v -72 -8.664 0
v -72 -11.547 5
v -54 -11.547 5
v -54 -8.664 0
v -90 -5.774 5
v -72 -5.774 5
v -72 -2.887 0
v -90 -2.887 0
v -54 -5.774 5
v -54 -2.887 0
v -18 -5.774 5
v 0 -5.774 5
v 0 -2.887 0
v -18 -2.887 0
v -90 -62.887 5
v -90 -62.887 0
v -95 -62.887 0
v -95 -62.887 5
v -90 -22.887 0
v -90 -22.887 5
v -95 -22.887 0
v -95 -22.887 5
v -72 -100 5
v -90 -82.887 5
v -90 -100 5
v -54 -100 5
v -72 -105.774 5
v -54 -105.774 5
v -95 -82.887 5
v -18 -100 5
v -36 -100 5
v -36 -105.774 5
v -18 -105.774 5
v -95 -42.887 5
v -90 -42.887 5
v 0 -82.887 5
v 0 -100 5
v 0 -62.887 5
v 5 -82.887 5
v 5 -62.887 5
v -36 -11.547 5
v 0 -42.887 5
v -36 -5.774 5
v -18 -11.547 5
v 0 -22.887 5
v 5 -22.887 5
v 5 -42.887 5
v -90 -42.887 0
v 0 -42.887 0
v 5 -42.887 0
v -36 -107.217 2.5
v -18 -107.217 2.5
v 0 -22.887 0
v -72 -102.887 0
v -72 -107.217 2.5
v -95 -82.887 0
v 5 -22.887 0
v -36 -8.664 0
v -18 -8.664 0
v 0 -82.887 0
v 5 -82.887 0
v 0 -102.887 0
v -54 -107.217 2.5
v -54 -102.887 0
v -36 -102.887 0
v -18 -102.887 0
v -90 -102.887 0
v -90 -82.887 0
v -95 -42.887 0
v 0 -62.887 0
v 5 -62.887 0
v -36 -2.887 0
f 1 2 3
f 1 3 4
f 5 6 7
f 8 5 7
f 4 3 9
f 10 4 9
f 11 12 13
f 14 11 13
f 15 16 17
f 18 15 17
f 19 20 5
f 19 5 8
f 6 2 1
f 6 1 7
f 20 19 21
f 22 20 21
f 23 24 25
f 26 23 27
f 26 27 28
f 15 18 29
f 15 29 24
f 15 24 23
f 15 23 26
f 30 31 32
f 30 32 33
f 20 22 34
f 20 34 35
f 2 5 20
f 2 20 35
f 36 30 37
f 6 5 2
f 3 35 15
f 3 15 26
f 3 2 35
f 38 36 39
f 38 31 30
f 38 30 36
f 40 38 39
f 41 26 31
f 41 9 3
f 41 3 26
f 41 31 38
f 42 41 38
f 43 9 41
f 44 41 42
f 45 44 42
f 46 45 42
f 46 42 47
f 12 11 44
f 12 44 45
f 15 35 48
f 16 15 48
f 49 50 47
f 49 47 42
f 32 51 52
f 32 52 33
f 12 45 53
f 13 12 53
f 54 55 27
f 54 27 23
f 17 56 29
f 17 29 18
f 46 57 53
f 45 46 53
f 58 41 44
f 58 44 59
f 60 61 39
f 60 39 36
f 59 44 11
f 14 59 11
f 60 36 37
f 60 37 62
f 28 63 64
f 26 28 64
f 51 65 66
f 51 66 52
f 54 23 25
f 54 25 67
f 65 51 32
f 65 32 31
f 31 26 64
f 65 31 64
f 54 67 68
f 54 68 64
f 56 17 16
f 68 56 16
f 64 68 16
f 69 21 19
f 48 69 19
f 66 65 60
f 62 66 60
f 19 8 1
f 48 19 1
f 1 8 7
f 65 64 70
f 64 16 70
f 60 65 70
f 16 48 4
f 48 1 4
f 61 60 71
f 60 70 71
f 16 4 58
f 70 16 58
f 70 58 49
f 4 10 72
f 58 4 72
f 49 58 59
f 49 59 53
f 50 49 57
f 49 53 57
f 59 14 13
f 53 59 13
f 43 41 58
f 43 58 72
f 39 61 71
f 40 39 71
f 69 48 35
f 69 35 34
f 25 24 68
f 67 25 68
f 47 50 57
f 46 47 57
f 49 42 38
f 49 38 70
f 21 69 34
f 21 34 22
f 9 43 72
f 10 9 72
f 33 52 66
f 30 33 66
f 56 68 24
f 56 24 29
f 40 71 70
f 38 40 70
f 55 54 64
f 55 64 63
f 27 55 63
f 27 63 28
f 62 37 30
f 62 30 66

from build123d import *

# Parameters (mm, degrees)
ESQUISSE1_W                    = 90
ESQUISSE1_H                    = 100
BOSS_EXTRU_3_DEPTH             = 5
ENL_V_MAT_EXTRU_3_DEPTH        = 135.629120178
BOSS_EXTRU_4_DEPTH             = 90
ESQUISSE7_W                    = 18
ESQUISSE7_H                    = 5.773502692
ENL_V_MAT_EXTRU_4_DEPTH        = 137.787000854
ESQUISSE8_W                    = 18
ESQUISSE8_H                    = 5
ENL_V_MAT_EXTRU_5_DEPTH        = 133.498992691
ESQUISSE9_W                    = 18
ESQUISSE9_H                    = 5
ENL_V_MAT_EXTRU_6_DEPTH        = 133.498992691
BOSS_EXTRU_5_REACH             = 118.304
BOSS_EXTRU_5_DIRECTION_2_REACH = 118.304
ESQUISSE11_W                   = 18
ESQUISSE11_H                   = 13
BOSS_EXTRU_6_DEPTH             = 5
ENL_V_MAT_EXTRU_7_DEPTH        = 135.082064423
ESQUISSE13_W                   = 5
ESQUISSE13_H                   = 20
BOSS_EXTRU_7_DEPTH             = 5


with BuildPart() as part:
    # Esquisse1 → Boss.-Extru.3 (new body)
    with BuildSketch(Plane.XY):
        with Locations((-45, -50)):
            Rectangle(ESQUISSE1_W, ESQUISSE1_H)
    extrude(amount=BOSS_EXTRU_3_DEPTH)

    # Esquisse5 → Enlèv. mat.-Extru.3 (cut, through all)
    with BuildSketch(Plane(origin=(0, 0, 0), x_dir=(0, 0, -1), z_dir=(1, 0, 0))):
        Polygon((0, 0), (-5, 0), (-5, -5.773502692), (0, -2.886751346), align=None)
    extrude(amount=-ENL_V_MAT_EXTRU_3_DEPTH, mode=Mode.SUBTRACT)

    # Esquisse6 → Boss.-Extru.4 (add, through all)
    with BuildSketch(Plane(origin=(0, 0, 0), x_dir=(0, 0, -1), z_dir=(1, 0, 0))):
        Polygon((0, -100), (-5, -100), (0, -102.886751346), align=None)
    extrude(amount=-BOSS_EXTRU_4_DEPTH)

    # Esquisse7 → Enlèv. mat.-Extru.4 (cut, through all)
    with BuildSketch(Plane.XY.offset(5)):
        with Locations((-63, -8.660254038)):
            Rectangle(ESQUISSE7_W, ESQUISSE7_H)
        with Locations((-27, -8.660254038)):
            Rectangle(ESQUISSE7_W, ESQUISSE7_H)
    extrude(amount=-ENL_V_MAT_EXTRU_4_DEPTH, mode=Mode.SUBTRACT)

    # Esquisse8 → Enlèv. mat.-Extru.5 (cut, through all)
    with BuildSketch(Plane.XZ.offset(5.773502692)):
        with Locations((-63, 2.5)):
            Rectangle(ESQUISSE8_W, ESQUISSE8_H)
    extrude(amount=-ENL_V_MAT_EXTRU_5_DEPTH, mode=Mode.SUBTRACT)

    # Esquisse9 → Enlèv. mat.-Extru.6 (cut, through all)
    with BuildSketch(Plane.XZ.offset(5.773502692)):
        with Locations((-27, 2.5)):
            Rectangle(ESQUISSE9_W, ESQUISSE9_H)
    extrude(amount=-ENL_V_MAT_EXTRU_6_DEPTH, mode=Mode.SUBTRACT)

    # Esquisse10 → Boss.-Extru.5 (add, up to next)
    with BuildSketch(Plane(origin=(-36, 0, 0), x_dir=(0, 0, -1), z_dir=(1, 0, 0)), mode=Mode.PRIVATE) as boss_extru_5_sk1:
        Polygon((0, -11.547005384), (-5, -11.547005384), (0, -8.66380151), align=None)
    boss_extru_5_tool1 = extrude(boss_extru_5_sk1.sketch, amount=-BOSS_EXTRU_5_REACH, mode=Mode.PRIVATE) - part.part
    add(boss_extru_5_tool1.solids().sort_by_distance((-36, -10.585937, 1.666667))[0])

    # Esquisse10 → Boss.-Extru.5 direction 2 (add, up to next)
    with BuildSketch(Plane(origin=(-36, 0, 0), x_dir=(0, 0, -1), z_dir=(1, 0, 0)), mode=Mode.PRIVATE) as boss_extru_5_direction_2_sk1:
        Polygon((0, -11.547005384), (-5, -11.547005384), (0, -8.66380151), align=None)
    boss_extru_5_direction_2_tool1 = extrude(boss_extru_5_direction_2_sk1.sketch, amount=BOSS_EXTRU_5_DIRECTION_2_REACH, mode=Mode.PRIVATE) - part.part
    add(boss_extru_5_direction_2_tool1.solids().sort_by_distance((-36, -10.585937, 1.666667))[0])

    # Esquisse11 → Boss.-Extru.6 (add, through all)
    with BuildSketch(Plane.XY.offset(5)):
        with Locations((-63, -106.5)):
            Rectangle(ESQUISSE11_W, ESQUISSE11_H)
        with Locations((-27, -106.5)):
            Rectangle(ESQUISSE11_W, ESQUISSE11_H)
    extrude(amount=-BOSS_EXTRU_6_DEPTH)

    # Esquisse12 → Enlèv. mat.-Extru.7 (cut, through all)
    with BuildSketch(Plane.ZY.offset(72)):
        Polygon((0, -102.886751346), (2.5, -107.216878365), (5, -105.773502692), (5, -113), (0, -113), align=None)
    extrude(amount=-ENL_V_MAT_EXTRU_7_DEPTH, mode=Mode.SUBTRACT)

    # Esquisse13 → Boss.-Extru.7 (add, through all)
    with BuildSketch(Plane(origin=(0, 0, 0), x_dir=(-1, 0, 0), z_dir=(0, 0, -1))):
        with Locations((92.5, -32.886751346)):
            Rectangle(ESQUISSE13_W, ESQUISSE13_H)
        with Locations((92.5, -72.886751346)):
            Rectangle(ESQUISSE13_W, ESQUISSE13_H)
        with Locations((-2.5, -72.886751346)):
            Rectangle(ESQUISSE13_W, ESQUISSE13_H)
        with Locations((-2.5, -32.886751346)):
            Rectangle(ESQUISSE13_W, ESQUISSE13_H)
    extrude(amount=-BOSS_EXTRU_7_DEPTH)


solid = part.part
